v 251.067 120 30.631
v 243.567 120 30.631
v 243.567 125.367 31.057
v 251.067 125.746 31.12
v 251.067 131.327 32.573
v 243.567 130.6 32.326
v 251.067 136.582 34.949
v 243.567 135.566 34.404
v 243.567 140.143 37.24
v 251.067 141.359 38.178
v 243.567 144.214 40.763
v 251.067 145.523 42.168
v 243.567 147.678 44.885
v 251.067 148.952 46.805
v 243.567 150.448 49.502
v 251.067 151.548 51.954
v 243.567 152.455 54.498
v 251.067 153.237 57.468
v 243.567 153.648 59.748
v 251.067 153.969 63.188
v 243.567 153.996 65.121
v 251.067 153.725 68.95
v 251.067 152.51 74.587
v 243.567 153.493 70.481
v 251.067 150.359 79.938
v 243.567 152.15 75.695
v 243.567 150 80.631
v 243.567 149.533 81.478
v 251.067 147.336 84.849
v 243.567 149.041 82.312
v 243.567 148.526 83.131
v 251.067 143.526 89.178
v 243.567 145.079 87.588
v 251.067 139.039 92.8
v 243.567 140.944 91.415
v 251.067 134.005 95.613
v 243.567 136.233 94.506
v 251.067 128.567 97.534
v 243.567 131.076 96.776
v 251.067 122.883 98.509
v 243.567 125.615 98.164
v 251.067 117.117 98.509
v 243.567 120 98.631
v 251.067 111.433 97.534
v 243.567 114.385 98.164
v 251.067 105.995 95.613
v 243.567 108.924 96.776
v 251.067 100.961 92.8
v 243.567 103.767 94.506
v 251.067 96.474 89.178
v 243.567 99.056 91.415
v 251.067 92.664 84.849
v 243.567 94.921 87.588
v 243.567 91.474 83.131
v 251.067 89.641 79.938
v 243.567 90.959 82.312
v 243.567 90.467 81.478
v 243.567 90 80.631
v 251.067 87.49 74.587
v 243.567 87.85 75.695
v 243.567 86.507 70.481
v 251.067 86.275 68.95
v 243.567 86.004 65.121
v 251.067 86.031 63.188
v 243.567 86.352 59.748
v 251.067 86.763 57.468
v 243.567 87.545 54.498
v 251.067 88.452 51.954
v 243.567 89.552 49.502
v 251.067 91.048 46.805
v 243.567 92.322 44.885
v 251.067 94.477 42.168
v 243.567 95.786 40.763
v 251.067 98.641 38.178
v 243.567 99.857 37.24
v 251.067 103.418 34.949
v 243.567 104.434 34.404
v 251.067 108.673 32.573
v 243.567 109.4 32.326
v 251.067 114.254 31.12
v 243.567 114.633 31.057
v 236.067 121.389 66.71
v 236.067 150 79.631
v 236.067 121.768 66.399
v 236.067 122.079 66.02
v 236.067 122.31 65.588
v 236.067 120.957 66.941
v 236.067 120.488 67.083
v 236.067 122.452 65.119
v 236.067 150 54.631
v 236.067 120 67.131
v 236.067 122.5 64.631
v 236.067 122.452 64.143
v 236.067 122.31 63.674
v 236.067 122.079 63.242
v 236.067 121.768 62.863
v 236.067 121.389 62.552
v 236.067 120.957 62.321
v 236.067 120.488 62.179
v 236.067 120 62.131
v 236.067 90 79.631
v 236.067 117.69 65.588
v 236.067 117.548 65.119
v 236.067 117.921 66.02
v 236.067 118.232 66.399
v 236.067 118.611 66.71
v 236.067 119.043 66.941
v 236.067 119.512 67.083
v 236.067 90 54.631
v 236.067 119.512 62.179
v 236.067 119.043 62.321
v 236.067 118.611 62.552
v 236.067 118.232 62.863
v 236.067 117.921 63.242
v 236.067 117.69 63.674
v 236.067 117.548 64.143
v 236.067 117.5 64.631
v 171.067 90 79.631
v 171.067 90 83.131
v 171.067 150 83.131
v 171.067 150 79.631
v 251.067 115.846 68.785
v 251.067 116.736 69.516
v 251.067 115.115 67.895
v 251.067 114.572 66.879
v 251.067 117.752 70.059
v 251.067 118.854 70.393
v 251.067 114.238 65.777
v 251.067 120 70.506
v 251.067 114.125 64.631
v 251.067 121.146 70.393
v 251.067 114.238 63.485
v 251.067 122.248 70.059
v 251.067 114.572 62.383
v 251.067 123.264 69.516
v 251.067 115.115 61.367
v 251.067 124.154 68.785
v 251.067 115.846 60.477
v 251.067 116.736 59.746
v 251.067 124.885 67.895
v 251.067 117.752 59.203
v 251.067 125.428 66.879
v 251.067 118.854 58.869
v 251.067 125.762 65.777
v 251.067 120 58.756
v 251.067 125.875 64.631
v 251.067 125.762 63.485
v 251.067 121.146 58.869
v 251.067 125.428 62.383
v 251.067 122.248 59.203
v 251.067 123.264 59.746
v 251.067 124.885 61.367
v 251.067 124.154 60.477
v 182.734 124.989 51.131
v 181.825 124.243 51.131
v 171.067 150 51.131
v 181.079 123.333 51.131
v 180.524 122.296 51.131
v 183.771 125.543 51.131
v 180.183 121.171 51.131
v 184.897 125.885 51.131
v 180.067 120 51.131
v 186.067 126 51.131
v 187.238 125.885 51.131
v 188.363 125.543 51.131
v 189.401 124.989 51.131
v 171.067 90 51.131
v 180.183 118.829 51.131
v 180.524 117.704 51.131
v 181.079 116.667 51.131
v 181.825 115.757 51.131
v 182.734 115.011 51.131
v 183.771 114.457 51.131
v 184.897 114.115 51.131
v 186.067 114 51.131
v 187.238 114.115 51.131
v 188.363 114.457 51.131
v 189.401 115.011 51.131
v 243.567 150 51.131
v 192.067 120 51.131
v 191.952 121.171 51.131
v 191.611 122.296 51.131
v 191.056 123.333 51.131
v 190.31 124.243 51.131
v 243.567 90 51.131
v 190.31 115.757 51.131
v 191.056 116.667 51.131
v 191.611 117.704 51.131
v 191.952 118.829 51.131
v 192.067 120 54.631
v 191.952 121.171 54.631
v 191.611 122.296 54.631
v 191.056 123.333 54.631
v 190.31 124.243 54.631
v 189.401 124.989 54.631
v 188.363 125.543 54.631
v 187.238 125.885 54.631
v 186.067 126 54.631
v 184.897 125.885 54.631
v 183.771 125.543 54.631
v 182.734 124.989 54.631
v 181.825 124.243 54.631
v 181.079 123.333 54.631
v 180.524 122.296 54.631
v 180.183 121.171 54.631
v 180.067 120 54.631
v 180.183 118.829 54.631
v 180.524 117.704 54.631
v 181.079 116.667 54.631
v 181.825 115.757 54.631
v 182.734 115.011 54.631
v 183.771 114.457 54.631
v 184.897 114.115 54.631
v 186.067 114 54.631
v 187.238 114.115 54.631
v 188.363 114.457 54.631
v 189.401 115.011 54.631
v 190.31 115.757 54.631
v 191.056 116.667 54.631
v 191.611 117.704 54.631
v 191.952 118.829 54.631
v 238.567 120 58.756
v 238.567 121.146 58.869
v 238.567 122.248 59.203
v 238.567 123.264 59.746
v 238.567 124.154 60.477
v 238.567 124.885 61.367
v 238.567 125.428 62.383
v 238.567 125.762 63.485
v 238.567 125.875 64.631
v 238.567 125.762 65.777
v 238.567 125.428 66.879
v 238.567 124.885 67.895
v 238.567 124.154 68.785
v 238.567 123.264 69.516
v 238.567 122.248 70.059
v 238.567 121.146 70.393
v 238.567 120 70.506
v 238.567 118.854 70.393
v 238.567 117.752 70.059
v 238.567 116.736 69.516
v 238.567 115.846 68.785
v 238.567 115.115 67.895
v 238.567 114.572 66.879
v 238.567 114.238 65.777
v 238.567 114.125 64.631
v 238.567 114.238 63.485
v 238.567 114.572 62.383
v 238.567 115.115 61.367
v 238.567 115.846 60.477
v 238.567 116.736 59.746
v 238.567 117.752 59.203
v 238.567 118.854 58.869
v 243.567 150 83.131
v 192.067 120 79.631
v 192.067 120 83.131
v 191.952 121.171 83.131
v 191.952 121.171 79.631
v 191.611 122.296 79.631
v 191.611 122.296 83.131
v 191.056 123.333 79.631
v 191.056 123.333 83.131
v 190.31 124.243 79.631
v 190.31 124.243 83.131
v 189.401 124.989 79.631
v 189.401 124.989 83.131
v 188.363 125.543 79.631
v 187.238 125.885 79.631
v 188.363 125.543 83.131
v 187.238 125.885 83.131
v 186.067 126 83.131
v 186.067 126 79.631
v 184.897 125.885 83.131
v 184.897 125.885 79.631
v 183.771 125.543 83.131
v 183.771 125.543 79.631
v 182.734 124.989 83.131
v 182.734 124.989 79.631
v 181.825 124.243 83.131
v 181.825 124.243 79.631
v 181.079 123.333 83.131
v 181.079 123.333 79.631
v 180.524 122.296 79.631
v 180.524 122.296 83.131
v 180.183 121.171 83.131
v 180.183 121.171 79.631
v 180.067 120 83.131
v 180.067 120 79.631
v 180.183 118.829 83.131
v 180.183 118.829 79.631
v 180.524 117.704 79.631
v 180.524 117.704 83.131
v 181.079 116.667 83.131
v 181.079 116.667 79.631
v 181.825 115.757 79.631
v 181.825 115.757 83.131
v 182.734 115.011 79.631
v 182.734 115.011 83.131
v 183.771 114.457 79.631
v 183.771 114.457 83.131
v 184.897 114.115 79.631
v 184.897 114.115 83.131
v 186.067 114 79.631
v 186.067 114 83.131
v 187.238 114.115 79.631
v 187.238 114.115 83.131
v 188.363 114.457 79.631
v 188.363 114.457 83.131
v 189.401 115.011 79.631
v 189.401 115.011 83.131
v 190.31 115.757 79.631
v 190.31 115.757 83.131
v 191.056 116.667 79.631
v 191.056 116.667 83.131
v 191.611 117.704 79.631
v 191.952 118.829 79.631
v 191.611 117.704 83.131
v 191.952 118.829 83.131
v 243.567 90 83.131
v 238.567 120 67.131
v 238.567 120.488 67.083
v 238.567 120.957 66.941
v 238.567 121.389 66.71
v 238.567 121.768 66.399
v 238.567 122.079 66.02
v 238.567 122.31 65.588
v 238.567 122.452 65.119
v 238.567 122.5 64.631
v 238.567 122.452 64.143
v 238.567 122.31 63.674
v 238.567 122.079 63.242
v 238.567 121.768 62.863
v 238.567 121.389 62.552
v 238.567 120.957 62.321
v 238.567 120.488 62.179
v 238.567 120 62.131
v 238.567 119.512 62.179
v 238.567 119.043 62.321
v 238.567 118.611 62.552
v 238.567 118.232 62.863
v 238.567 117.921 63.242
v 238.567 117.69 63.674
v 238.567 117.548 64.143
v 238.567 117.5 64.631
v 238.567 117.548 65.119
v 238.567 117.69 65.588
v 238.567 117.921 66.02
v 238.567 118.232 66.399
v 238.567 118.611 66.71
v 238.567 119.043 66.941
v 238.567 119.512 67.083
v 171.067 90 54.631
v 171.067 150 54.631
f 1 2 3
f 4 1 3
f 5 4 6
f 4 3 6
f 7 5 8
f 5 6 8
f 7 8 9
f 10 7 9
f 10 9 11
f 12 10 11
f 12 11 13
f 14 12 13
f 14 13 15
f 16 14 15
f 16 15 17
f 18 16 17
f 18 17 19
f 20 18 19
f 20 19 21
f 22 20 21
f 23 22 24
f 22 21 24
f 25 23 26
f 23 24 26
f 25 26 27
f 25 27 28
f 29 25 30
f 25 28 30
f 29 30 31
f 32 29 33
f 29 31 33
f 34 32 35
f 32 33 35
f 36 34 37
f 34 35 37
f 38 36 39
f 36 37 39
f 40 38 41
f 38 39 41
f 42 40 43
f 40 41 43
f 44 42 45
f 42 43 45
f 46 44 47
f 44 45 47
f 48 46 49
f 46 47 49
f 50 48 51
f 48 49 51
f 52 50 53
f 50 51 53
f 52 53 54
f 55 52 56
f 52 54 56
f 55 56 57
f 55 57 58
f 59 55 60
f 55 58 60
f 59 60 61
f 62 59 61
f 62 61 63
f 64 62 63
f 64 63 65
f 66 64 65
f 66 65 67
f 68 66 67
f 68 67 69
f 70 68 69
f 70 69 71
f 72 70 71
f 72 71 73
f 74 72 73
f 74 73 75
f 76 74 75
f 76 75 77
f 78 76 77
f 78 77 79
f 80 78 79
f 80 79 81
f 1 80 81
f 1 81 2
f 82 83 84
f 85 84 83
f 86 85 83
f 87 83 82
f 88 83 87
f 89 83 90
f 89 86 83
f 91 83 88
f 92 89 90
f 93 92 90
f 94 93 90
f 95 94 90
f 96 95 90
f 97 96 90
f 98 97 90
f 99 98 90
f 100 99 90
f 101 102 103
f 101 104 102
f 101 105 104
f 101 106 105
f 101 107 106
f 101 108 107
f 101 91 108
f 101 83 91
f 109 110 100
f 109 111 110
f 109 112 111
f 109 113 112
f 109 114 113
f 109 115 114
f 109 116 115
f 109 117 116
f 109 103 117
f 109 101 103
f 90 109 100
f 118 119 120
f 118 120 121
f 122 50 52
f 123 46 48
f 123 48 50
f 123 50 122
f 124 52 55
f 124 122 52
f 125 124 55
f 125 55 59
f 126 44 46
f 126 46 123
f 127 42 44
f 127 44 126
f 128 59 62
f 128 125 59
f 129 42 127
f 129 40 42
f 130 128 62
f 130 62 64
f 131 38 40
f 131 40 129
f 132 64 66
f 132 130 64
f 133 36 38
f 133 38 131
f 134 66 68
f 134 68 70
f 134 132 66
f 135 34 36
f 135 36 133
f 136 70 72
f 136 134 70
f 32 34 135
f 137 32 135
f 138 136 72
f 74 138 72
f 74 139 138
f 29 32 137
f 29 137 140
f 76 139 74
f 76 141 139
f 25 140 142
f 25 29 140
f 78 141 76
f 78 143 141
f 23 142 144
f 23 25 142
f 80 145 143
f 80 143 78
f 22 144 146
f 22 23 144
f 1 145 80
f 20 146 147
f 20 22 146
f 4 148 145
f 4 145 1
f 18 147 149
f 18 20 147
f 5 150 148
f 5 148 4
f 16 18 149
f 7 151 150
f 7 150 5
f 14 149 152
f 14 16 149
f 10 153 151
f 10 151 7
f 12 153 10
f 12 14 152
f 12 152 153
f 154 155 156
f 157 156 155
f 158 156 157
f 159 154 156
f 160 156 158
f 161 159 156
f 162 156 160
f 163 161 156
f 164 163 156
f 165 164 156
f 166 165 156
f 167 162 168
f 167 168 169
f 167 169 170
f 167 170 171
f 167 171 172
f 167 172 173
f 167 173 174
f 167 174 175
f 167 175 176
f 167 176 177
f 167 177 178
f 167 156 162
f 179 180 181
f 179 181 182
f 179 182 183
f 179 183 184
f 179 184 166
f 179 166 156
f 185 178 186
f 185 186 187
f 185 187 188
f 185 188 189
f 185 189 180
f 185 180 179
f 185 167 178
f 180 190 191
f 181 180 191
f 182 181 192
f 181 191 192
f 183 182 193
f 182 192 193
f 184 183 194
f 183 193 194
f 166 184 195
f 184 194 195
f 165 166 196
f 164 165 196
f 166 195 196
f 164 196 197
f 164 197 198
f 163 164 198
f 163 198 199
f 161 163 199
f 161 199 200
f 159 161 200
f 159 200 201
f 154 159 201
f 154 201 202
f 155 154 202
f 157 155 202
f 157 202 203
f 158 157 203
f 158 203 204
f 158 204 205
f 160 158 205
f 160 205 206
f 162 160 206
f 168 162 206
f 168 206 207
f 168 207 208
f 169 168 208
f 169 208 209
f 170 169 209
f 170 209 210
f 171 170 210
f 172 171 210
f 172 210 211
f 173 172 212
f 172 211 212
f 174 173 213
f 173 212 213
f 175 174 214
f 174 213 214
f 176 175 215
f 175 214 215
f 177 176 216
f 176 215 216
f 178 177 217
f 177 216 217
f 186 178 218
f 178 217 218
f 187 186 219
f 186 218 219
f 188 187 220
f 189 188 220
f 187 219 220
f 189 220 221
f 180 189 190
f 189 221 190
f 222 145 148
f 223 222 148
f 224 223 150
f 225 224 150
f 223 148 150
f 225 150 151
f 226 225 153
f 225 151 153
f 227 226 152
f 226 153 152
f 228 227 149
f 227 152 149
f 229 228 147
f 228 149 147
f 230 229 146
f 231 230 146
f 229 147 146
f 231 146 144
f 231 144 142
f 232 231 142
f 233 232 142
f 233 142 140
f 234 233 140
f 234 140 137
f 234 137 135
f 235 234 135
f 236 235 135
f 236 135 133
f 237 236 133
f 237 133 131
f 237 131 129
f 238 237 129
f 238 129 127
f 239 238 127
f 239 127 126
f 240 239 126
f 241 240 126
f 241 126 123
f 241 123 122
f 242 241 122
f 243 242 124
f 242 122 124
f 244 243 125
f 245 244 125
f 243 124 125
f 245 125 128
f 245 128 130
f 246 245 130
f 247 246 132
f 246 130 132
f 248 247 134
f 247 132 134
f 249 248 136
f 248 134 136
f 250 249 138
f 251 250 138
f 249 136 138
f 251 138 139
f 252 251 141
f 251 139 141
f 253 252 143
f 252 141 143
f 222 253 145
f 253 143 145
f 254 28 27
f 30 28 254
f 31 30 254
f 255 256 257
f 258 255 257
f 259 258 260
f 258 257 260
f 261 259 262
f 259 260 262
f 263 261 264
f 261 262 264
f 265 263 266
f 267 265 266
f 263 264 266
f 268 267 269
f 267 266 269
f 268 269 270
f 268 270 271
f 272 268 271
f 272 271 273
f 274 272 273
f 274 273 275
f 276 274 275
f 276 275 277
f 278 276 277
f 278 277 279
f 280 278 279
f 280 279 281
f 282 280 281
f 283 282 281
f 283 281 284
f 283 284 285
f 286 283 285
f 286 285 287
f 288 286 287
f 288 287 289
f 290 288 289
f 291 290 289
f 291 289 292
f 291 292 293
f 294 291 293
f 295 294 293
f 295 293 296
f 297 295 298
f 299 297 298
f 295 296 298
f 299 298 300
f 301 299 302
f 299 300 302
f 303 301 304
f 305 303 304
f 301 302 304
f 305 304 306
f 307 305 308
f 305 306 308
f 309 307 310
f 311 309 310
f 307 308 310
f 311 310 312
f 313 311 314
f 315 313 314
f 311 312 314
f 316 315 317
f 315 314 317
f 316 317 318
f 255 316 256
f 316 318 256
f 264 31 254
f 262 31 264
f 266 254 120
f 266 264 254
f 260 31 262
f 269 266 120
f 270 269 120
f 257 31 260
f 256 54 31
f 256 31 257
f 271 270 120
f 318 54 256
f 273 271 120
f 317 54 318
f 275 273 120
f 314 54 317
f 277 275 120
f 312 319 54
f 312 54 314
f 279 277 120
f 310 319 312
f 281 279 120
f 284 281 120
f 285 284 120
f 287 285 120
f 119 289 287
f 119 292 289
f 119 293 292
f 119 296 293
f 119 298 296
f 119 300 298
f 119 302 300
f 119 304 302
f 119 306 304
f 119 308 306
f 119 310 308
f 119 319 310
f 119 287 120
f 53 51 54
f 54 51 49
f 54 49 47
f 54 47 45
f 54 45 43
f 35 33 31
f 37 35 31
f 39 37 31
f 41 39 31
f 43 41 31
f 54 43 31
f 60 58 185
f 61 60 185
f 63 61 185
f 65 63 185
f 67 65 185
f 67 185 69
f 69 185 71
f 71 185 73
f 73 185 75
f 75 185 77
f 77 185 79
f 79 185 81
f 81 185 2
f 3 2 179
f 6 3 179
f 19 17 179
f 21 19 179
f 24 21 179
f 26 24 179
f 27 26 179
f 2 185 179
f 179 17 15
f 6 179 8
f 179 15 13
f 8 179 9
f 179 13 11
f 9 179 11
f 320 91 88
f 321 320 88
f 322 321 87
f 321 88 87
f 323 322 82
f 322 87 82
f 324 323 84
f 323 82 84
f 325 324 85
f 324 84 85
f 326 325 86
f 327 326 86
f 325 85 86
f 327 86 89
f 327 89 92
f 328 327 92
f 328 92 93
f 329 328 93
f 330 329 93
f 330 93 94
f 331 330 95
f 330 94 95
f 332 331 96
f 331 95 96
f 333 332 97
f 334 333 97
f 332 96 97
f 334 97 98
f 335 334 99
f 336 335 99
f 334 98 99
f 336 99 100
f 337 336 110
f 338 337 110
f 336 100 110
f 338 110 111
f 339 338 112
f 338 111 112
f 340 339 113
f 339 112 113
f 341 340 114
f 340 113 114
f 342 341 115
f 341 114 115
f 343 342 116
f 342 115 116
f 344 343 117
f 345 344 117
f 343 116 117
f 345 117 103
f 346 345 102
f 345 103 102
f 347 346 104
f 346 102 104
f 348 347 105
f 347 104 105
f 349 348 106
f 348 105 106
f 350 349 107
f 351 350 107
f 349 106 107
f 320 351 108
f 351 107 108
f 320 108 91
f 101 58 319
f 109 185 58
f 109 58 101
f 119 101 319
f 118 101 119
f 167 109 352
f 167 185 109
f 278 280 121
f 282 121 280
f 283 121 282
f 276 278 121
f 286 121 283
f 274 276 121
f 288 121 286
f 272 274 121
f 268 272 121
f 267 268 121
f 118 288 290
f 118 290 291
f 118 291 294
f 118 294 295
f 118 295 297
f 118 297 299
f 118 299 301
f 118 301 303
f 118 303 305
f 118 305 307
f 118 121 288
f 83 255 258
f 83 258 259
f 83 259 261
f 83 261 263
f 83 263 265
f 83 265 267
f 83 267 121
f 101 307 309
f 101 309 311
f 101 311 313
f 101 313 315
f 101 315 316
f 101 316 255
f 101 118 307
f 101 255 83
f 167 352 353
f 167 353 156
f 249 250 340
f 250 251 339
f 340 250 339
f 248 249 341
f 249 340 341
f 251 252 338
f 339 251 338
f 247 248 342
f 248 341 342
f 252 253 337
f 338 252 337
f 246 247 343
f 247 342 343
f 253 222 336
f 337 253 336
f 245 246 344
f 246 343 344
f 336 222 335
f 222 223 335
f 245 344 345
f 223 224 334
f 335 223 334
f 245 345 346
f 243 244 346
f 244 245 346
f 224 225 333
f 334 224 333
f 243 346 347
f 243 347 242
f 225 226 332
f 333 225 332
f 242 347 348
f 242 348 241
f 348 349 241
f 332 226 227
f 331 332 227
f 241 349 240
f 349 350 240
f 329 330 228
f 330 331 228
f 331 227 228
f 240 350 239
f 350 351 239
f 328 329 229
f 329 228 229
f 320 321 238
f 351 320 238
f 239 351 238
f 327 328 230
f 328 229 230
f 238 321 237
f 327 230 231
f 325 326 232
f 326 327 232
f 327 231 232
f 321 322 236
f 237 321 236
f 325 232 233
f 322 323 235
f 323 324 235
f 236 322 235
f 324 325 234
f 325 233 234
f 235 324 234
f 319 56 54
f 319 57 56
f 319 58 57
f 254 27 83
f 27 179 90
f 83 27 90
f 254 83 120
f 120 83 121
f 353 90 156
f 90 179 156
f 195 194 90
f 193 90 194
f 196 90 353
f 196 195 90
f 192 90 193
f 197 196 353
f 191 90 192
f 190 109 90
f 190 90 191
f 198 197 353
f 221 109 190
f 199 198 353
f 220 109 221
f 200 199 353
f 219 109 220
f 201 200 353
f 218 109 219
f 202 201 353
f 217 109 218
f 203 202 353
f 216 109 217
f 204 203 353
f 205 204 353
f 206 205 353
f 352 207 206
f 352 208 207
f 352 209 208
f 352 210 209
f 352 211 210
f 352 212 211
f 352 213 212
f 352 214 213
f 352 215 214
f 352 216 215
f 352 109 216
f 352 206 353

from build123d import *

# Parameters (mm, degrees)
BOSS_EXTRUDE1_DEPTH         = 240
SKETCH5_R                   = 136
BOSS_EXTRUDE2_DEPTH         = 30
IZIM1_R                     = 23.5
KES_EKSTR_ZYON1_DEPTH       = 80
IZIM2_R                     = 25
IZIM2_R_2                   = 10
Y_KSEKLIK_EKSTR_ZYON1_DEPTH = 10
SCALE1_SCALE                = 0.25
SKETCH6_R                   = 6
CUT_EXTRUDE1_DEPTH          = 200


with BuildPart() as part:
    # Sketch1 → Boss-Extrude1 (new body)
    with BuildSketch(Plane(origin=(0, 0, 0), x_dir=(1, 0, 0), z_dir=(0, 1, 0))):
        Polygon((0, -20), (0, -6), (290, -6), (290, -134), (0, -134), (0, -120), (260, -120), (260, -20), align=None)
    extrude(amount=BOSS_EXTRUDE1_DEPTH)

    # Sketch5 → Boss-Extrude2 (add)
    with BuildSketch(Plane(origin=(290, 0, 0), x_dir=(0, 0, -1), z_dir=(1, 0, 0))):
        with Locations((-60, 120)):
            Circle(SKETCH5_R)
    extrude(amount=BOSS_EXTRUDE2_DEPTH)

    # Çizim1 → Kes-Ekstrüzyon1 (cut)
    with BuildSketch(Plane(origin=(320, 0, 0), x_dir=(0, 0, -1), z_dir=(1, 0, 0))):
        with Locations((-60, 120)):
            Circle(IZIM1_R)
    extrude(amount=-KES_EKSTR_ZYON1_DEPTH, mode=Mode.SUBTRACT)

    # Çizim2 → Yükseklik-Ekstrüzyon1 (add)
    with BuildSketch(Plane.ZY.offset(-260)):
        with Locations((60, 120)):
            Circle(IZIM2_R)
        with Locations((60, 120)):
            Circle(IZIM2_R_2, mode=Mode.SUBTRACT)
    extrude(amount=-Y_KSEKLIK_EKSTR_ZYON1_DEPTH)


with BuildPart() as part_1:
    # Scale1: scaled about (228.089824151, 120, 66.174750275)
    add(part.part.scale(SCALE1_SCALE).moved(Location((171.067368113, 90, 49.631062706))))

    # Sketch6 → Cut-Extrude1 (cut)
    with BuildSketch(Plane.XY.offset(83.131062707)):
        with Locations((186.067368113, 120)):
            Circle(SKETCH6_R)
    extrude(amount=-CUT_EXTRUDE1_DEPTH, mode=Mode.SUBTRACT)


solid = part_1.part
